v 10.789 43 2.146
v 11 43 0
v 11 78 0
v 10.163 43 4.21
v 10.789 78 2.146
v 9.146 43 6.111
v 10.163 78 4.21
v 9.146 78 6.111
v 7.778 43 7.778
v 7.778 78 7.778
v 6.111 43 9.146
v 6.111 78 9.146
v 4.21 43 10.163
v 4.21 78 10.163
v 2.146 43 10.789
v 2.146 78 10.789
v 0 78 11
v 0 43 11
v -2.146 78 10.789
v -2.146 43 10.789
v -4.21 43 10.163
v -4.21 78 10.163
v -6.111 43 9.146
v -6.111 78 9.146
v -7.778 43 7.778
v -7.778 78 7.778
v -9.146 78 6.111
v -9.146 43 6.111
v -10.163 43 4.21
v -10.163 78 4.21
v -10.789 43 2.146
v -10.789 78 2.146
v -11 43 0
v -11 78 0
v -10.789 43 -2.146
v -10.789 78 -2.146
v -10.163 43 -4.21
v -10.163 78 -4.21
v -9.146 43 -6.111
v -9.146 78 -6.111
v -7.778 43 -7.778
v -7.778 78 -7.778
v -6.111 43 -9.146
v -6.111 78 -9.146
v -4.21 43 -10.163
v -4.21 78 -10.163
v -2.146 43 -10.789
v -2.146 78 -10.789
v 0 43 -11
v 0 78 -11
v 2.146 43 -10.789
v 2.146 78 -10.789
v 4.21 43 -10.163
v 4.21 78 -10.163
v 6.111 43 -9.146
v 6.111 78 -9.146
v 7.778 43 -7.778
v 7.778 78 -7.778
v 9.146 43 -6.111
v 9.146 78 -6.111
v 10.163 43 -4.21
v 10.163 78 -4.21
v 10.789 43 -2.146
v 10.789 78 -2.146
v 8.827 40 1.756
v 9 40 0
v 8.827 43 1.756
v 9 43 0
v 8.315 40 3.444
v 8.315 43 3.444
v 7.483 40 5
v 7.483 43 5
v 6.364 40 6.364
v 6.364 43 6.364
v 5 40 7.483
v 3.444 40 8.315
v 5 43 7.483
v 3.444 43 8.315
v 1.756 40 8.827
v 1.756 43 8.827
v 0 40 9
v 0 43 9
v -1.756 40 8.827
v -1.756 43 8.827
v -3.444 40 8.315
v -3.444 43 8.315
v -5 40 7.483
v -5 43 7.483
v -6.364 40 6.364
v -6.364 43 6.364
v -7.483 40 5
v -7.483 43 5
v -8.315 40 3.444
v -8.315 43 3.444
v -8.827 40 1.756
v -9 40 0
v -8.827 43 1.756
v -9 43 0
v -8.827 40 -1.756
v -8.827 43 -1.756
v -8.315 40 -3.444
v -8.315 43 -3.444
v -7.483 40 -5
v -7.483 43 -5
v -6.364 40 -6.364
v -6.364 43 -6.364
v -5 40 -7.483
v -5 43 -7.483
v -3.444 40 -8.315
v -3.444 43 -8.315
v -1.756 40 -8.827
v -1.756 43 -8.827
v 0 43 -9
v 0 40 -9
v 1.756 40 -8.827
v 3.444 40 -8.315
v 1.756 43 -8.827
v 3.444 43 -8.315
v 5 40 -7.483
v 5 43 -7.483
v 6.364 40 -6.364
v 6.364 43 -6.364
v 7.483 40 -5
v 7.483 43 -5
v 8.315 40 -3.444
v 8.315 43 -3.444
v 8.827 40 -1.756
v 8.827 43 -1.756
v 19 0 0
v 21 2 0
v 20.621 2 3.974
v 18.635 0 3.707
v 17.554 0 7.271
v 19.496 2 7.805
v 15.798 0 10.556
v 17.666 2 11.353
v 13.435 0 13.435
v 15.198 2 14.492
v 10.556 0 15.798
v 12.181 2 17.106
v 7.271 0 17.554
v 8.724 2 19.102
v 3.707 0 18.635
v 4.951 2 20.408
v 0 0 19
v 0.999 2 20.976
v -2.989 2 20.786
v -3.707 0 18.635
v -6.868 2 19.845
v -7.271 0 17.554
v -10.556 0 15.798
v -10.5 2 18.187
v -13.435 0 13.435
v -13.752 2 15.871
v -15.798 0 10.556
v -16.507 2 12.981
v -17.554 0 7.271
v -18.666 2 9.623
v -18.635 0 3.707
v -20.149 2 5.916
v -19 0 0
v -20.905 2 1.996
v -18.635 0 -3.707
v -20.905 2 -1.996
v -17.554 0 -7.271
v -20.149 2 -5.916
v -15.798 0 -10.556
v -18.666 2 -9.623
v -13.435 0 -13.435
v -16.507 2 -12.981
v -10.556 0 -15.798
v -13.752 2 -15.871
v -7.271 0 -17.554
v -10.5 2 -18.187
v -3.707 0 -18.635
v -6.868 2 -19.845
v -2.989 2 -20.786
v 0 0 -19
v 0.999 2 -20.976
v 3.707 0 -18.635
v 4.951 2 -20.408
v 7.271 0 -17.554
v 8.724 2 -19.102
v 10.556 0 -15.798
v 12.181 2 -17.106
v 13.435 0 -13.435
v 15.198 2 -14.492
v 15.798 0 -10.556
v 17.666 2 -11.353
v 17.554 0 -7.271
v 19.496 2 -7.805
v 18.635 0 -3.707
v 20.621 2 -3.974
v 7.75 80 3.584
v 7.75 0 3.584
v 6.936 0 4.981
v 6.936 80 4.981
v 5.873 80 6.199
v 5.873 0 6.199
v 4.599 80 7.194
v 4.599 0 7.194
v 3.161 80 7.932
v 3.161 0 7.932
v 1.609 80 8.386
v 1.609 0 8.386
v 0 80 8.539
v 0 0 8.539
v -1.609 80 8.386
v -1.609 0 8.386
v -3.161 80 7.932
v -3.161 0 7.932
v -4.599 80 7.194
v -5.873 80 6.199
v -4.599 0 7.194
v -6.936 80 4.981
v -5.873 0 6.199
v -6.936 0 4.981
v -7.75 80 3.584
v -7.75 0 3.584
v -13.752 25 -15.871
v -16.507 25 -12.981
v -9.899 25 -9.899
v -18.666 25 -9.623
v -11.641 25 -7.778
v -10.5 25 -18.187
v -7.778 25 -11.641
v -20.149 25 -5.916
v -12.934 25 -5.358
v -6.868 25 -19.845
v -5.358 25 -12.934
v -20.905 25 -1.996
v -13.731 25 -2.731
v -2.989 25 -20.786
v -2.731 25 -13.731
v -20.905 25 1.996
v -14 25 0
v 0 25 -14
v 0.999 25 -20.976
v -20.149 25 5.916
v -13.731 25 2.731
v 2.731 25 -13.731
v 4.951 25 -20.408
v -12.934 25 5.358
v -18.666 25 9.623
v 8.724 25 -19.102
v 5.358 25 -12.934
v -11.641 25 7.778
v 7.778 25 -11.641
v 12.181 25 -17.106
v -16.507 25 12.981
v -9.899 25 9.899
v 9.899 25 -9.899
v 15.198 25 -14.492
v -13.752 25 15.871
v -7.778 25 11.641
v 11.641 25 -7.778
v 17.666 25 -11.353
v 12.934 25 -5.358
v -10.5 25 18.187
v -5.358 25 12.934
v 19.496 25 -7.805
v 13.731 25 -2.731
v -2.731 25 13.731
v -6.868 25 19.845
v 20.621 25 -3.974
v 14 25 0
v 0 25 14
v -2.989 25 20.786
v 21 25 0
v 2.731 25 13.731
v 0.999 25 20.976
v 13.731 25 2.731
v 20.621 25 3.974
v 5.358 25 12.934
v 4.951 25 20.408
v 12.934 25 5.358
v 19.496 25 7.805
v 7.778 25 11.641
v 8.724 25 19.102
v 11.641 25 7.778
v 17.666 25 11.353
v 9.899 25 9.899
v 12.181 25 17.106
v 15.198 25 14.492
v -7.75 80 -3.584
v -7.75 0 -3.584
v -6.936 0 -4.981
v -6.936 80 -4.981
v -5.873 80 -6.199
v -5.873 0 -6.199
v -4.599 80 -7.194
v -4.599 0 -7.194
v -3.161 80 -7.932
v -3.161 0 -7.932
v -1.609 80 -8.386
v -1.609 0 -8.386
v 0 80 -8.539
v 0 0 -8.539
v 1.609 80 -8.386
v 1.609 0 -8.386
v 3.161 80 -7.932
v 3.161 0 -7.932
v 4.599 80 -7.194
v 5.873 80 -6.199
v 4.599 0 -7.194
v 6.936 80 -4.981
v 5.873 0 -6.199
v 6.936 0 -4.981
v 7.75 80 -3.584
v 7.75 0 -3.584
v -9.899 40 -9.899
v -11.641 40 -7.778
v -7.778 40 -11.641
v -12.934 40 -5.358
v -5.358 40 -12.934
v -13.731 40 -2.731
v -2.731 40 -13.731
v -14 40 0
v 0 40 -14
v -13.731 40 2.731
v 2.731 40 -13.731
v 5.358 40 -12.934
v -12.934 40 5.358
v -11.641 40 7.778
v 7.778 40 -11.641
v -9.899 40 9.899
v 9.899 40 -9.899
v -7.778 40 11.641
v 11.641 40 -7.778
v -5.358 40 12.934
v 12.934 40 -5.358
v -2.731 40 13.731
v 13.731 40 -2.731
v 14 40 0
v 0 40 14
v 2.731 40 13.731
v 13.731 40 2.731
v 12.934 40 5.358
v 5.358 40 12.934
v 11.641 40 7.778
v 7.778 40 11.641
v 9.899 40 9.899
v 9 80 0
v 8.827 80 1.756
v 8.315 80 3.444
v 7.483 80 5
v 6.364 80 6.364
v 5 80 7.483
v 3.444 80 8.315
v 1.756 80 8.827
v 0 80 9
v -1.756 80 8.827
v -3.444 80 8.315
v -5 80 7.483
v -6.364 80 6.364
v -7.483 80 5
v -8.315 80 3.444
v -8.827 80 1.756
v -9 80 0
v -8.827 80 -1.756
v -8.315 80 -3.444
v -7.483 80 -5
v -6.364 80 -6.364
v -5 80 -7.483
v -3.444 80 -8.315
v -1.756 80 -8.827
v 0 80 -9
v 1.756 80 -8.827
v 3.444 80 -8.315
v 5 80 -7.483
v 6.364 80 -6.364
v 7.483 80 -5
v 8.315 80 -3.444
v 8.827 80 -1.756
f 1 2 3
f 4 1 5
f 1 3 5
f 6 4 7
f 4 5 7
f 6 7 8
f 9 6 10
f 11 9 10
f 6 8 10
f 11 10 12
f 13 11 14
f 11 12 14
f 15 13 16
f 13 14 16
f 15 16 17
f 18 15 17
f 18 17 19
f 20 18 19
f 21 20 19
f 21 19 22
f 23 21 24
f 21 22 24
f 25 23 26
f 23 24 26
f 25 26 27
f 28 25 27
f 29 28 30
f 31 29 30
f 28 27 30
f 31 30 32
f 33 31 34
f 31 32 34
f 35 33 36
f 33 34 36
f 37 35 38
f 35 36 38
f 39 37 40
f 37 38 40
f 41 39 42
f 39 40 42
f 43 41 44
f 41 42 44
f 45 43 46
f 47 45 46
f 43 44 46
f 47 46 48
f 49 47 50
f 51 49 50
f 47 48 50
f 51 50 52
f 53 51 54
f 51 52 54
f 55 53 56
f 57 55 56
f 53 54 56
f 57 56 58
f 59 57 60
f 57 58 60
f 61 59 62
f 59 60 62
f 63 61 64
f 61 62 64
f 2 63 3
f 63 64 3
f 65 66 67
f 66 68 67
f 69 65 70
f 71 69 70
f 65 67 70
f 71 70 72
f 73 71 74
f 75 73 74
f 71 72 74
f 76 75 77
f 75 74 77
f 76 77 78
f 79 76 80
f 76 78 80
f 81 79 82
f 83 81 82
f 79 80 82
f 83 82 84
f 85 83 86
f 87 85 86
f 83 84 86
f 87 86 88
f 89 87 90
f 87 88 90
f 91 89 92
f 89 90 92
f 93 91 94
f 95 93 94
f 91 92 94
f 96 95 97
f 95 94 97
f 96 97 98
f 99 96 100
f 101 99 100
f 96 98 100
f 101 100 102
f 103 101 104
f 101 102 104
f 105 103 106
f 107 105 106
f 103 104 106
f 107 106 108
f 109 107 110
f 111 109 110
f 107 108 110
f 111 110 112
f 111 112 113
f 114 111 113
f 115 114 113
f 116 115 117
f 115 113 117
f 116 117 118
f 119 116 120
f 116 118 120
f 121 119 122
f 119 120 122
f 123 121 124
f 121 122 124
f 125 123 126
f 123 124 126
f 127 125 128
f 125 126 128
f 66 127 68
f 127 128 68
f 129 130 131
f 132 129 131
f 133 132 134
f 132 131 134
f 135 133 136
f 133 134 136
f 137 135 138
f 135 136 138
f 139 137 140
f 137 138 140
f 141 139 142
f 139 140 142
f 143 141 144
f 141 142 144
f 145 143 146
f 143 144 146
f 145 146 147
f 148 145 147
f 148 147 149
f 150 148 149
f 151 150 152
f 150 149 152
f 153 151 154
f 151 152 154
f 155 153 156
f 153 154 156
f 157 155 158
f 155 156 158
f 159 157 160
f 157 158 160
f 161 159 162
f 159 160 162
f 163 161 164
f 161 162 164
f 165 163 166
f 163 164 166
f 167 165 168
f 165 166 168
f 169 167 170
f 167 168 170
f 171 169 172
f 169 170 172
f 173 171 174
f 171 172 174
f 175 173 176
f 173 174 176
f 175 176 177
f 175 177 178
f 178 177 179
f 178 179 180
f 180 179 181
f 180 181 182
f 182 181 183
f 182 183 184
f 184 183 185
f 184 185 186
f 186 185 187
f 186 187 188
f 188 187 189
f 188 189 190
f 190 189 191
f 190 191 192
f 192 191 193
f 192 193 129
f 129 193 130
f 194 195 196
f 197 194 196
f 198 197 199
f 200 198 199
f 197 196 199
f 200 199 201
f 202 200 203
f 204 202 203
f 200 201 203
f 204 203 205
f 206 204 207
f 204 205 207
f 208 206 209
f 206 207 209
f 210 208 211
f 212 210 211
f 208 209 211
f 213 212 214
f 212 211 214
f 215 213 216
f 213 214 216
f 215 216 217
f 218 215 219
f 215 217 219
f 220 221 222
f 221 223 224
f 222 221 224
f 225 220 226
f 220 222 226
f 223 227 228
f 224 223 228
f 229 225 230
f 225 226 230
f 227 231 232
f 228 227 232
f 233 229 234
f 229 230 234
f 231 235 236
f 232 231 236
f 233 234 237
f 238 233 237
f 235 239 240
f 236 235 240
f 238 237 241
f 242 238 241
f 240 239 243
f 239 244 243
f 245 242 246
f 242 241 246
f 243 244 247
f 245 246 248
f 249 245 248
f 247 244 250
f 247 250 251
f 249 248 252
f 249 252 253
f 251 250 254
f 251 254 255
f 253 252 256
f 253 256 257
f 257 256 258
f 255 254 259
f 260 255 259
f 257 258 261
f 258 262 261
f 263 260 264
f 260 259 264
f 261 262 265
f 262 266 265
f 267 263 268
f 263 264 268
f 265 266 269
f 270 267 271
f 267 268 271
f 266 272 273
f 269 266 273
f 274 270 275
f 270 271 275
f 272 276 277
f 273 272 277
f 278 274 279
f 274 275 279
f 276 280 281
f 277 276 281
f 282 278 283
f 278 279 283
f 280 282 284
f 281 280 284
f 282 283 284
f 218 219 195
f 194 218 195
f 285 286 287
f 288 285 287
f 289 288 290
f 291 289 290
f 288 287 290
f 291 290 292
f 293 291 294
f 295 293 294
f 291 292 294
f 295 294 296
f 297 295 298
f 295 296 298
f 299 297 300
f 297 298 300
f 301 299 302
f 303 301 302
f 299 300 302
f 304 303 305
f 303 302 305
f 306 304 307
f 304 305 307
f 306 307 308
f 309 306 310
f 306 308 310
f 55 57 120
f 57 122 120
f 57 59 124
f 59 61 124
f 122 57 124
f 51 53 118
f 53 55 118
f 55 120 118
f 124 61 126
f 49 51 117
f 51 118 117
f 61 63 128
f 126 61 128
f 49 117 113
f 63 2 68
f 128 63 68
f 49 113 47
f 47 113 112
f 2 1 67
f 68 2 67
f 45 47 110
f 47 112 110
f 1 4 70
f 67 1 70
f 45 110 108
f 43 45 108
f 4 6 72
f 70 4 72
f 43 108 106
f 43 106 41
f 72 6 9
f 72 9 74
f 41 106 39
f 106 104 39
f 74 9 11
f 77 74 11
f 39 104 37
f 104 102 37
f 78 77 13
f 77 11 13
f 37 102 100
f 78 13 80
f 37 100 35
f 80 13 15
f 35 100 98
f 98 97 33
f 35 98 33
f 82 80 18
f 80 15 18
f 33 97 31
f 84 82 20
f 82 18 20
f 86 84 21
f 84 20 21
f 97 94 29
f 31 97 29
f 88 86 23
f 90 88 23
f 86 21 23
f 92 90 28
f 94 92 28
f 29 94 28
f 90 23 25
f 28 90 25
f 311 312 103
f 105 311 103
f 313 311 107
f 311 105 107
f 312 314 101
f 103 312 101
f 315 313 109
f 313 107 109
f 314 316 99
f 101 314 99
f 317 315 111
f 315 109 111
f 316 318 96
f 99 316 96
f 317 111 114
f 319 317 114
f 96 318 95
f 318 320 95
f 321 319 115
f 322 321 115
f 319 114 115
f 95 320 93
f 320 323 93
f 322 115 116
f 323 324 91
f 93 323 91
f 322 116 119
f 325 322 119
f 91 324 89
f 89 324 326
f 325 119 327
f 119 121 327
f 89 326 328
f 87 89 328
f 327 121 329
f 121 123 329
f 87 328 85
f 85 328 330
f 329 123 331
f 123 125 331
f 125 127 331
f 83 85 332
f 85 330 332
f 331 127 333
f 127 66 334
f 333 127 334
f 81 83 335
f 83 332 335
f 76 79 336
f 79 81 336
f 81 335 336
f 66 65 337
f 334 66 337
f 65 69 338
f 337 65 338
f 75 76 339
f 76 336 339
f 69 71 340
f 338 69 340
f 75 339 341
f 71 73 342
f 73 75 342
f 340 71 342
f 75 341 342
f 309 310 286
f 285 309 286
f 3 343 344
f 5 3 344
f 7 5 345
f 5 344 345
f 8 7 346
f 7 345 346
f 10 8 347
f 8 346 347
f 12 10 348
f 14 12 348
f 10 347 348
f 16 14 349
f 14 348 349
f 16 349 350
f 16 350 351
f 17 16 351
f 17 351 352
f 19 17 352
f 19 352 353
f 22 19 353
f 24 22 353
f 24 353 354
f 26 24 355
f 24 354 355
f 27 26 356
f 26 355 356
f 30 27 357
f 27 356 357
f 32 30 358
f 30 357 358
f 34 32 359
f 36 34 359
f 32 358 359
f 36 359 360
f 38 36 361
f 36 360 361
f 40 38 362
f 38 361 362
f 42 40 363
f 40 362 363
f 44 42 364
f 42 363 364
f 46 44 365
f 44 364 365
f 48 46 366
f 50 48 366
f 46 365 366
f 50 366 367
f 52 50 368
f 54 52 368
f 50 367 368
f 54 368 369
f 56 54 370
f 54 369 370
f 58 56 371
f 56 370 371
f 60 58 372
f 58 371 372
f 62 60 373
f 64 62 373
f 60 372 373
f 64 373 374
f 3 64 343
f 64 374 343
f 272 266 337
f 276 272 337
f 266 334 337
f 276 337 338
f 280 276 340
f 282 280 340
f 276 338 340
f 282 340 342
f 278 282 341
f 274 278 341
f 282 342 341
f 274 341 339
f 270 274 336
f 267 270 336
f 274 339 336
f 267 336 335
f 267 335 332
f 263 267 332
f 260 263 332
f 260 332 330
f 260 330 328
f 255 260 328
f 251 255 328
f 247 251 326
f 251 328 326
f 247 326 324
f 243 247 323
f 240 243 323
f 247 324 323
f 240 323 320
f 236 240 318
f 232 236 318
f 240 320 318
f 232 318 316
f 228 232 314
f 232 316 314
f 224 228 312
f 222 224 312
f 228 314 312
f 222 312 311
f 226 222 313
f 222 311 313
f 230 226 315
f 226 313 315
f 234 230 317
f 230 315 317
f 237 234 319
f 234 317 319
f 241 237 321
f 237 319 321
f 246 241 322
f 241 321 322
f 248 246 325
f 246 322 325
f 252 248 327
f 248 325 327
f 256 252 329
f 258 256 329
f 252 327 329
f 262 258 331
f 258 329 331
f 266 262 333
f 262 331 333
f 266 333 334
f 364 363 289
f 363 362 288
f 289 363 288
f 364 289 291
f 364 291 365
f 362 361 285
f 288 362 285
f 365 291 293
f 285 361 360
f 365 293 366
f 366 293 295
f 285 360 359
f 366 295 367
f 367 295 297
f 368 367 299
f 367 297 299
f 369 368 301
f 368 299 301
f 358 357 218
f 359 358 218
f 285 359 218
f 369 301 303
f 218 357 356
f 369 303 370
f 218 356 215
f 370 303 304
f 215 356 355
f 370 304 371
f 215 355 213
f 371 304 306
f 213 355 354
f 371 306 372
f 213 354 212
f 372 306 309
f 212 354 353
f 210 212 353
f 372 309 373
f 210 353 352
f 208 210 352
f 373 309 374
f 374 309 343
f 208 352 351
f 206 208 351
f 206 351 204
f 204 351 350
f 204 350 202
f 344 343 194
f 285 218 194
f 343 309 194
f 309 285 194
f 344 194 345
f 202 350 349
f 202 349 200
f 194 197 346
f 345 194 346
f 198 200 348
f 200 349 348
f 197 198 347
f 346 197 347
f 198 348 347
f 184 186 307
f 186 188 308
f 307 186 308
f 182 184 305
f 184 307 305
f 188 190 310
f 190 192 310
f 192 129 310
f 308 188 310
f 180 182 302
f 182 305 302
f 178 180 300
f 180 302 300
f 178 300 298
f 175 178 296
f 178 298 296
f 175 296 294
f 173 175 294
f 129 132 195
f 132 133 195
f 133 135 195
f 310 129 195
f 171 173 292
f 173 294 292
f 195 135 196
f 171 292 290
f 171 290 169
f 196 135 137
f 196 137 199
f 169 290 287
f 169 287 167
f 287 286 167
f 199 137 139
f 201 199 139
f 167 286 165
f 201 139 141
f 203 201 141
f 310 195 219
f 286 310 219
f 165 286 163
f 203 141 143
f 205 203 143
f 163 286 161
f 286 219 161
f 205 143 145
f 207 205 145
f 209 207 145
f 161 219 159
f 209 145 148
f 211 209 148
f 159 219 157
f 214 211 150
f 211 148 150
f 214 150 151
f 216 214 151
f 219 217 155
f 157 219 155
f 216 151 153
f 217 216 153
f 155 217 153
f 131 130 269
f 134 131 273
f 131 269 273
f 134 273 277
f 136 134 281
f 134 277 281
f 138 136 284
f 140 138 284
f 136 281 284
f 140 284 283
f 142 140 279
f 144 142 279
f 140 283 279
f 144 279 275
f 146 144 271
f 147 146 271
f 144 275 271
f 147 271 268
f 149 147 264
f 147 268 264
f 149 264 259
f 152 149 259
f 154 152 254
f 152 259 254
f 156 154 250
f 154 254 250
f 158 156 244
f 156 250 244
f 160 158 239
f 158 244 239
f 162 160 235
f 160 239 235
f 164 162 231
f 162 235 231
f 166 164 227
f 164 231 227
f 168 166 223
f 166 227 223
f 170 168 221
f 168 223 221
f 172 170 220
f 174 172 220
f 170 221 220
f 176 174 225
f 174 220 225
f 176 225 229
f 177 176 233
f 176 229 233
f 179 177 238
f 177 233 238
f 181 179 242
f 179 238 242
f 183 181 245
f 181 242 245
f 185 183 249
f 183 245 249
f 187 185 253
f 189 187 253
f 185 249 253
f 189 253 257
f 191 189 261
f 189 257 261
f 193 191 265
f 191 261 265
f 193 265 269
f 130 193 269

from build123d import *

# Parameters (mm, degrees)
F2_SIZE2 = 2
F2_SIZE  = 2
F4_DEPTH = 100


with BuildPart() as f1:
    # F0 (on Top) → F1 (revolve)
    with BuildSketch(Plane.XY):
        Polygon((0, 80), (0, 0), (21, 0), (21, 25), (14, 25), (14, 40), (9, 40), (9, 43), (11, 43), (11, 80), align=None)
    revolve(axis=Axis((0, 40, 0), (0, -1, 0)))

    # F2
    f2_edges = [f1.edges().sort_by_distance(p)[0] for p in [
        (-11, 80, 0),
        (-21, 0, 0),
    ]]
    chamfer(f2_edges, length=F2_SIZE, length2=F2_SIZE2)

    # F3 (on Front) → F4 (cut)
    with BuildSketch(Plane.XZ):
        with BuildLine():
            Line((-7.75, 3.584375), (7.75, 3.584375))
            ThreePointArc((7.75, 3.584375), (0, 8.53875), (-7.75, 3.584375))
        make_face()
        with BuildLine():
            ThreePointArc((-7.75, -3.584375), (0, -8.53875), (7.75, -3.584375))
            Line((7.75, -3.584375), (-7.75, -3.584375))
        make_face()
    extrude(amount=-F4_DEPTH, mode=Mode.SUBTRACT)


solid = f1.part
